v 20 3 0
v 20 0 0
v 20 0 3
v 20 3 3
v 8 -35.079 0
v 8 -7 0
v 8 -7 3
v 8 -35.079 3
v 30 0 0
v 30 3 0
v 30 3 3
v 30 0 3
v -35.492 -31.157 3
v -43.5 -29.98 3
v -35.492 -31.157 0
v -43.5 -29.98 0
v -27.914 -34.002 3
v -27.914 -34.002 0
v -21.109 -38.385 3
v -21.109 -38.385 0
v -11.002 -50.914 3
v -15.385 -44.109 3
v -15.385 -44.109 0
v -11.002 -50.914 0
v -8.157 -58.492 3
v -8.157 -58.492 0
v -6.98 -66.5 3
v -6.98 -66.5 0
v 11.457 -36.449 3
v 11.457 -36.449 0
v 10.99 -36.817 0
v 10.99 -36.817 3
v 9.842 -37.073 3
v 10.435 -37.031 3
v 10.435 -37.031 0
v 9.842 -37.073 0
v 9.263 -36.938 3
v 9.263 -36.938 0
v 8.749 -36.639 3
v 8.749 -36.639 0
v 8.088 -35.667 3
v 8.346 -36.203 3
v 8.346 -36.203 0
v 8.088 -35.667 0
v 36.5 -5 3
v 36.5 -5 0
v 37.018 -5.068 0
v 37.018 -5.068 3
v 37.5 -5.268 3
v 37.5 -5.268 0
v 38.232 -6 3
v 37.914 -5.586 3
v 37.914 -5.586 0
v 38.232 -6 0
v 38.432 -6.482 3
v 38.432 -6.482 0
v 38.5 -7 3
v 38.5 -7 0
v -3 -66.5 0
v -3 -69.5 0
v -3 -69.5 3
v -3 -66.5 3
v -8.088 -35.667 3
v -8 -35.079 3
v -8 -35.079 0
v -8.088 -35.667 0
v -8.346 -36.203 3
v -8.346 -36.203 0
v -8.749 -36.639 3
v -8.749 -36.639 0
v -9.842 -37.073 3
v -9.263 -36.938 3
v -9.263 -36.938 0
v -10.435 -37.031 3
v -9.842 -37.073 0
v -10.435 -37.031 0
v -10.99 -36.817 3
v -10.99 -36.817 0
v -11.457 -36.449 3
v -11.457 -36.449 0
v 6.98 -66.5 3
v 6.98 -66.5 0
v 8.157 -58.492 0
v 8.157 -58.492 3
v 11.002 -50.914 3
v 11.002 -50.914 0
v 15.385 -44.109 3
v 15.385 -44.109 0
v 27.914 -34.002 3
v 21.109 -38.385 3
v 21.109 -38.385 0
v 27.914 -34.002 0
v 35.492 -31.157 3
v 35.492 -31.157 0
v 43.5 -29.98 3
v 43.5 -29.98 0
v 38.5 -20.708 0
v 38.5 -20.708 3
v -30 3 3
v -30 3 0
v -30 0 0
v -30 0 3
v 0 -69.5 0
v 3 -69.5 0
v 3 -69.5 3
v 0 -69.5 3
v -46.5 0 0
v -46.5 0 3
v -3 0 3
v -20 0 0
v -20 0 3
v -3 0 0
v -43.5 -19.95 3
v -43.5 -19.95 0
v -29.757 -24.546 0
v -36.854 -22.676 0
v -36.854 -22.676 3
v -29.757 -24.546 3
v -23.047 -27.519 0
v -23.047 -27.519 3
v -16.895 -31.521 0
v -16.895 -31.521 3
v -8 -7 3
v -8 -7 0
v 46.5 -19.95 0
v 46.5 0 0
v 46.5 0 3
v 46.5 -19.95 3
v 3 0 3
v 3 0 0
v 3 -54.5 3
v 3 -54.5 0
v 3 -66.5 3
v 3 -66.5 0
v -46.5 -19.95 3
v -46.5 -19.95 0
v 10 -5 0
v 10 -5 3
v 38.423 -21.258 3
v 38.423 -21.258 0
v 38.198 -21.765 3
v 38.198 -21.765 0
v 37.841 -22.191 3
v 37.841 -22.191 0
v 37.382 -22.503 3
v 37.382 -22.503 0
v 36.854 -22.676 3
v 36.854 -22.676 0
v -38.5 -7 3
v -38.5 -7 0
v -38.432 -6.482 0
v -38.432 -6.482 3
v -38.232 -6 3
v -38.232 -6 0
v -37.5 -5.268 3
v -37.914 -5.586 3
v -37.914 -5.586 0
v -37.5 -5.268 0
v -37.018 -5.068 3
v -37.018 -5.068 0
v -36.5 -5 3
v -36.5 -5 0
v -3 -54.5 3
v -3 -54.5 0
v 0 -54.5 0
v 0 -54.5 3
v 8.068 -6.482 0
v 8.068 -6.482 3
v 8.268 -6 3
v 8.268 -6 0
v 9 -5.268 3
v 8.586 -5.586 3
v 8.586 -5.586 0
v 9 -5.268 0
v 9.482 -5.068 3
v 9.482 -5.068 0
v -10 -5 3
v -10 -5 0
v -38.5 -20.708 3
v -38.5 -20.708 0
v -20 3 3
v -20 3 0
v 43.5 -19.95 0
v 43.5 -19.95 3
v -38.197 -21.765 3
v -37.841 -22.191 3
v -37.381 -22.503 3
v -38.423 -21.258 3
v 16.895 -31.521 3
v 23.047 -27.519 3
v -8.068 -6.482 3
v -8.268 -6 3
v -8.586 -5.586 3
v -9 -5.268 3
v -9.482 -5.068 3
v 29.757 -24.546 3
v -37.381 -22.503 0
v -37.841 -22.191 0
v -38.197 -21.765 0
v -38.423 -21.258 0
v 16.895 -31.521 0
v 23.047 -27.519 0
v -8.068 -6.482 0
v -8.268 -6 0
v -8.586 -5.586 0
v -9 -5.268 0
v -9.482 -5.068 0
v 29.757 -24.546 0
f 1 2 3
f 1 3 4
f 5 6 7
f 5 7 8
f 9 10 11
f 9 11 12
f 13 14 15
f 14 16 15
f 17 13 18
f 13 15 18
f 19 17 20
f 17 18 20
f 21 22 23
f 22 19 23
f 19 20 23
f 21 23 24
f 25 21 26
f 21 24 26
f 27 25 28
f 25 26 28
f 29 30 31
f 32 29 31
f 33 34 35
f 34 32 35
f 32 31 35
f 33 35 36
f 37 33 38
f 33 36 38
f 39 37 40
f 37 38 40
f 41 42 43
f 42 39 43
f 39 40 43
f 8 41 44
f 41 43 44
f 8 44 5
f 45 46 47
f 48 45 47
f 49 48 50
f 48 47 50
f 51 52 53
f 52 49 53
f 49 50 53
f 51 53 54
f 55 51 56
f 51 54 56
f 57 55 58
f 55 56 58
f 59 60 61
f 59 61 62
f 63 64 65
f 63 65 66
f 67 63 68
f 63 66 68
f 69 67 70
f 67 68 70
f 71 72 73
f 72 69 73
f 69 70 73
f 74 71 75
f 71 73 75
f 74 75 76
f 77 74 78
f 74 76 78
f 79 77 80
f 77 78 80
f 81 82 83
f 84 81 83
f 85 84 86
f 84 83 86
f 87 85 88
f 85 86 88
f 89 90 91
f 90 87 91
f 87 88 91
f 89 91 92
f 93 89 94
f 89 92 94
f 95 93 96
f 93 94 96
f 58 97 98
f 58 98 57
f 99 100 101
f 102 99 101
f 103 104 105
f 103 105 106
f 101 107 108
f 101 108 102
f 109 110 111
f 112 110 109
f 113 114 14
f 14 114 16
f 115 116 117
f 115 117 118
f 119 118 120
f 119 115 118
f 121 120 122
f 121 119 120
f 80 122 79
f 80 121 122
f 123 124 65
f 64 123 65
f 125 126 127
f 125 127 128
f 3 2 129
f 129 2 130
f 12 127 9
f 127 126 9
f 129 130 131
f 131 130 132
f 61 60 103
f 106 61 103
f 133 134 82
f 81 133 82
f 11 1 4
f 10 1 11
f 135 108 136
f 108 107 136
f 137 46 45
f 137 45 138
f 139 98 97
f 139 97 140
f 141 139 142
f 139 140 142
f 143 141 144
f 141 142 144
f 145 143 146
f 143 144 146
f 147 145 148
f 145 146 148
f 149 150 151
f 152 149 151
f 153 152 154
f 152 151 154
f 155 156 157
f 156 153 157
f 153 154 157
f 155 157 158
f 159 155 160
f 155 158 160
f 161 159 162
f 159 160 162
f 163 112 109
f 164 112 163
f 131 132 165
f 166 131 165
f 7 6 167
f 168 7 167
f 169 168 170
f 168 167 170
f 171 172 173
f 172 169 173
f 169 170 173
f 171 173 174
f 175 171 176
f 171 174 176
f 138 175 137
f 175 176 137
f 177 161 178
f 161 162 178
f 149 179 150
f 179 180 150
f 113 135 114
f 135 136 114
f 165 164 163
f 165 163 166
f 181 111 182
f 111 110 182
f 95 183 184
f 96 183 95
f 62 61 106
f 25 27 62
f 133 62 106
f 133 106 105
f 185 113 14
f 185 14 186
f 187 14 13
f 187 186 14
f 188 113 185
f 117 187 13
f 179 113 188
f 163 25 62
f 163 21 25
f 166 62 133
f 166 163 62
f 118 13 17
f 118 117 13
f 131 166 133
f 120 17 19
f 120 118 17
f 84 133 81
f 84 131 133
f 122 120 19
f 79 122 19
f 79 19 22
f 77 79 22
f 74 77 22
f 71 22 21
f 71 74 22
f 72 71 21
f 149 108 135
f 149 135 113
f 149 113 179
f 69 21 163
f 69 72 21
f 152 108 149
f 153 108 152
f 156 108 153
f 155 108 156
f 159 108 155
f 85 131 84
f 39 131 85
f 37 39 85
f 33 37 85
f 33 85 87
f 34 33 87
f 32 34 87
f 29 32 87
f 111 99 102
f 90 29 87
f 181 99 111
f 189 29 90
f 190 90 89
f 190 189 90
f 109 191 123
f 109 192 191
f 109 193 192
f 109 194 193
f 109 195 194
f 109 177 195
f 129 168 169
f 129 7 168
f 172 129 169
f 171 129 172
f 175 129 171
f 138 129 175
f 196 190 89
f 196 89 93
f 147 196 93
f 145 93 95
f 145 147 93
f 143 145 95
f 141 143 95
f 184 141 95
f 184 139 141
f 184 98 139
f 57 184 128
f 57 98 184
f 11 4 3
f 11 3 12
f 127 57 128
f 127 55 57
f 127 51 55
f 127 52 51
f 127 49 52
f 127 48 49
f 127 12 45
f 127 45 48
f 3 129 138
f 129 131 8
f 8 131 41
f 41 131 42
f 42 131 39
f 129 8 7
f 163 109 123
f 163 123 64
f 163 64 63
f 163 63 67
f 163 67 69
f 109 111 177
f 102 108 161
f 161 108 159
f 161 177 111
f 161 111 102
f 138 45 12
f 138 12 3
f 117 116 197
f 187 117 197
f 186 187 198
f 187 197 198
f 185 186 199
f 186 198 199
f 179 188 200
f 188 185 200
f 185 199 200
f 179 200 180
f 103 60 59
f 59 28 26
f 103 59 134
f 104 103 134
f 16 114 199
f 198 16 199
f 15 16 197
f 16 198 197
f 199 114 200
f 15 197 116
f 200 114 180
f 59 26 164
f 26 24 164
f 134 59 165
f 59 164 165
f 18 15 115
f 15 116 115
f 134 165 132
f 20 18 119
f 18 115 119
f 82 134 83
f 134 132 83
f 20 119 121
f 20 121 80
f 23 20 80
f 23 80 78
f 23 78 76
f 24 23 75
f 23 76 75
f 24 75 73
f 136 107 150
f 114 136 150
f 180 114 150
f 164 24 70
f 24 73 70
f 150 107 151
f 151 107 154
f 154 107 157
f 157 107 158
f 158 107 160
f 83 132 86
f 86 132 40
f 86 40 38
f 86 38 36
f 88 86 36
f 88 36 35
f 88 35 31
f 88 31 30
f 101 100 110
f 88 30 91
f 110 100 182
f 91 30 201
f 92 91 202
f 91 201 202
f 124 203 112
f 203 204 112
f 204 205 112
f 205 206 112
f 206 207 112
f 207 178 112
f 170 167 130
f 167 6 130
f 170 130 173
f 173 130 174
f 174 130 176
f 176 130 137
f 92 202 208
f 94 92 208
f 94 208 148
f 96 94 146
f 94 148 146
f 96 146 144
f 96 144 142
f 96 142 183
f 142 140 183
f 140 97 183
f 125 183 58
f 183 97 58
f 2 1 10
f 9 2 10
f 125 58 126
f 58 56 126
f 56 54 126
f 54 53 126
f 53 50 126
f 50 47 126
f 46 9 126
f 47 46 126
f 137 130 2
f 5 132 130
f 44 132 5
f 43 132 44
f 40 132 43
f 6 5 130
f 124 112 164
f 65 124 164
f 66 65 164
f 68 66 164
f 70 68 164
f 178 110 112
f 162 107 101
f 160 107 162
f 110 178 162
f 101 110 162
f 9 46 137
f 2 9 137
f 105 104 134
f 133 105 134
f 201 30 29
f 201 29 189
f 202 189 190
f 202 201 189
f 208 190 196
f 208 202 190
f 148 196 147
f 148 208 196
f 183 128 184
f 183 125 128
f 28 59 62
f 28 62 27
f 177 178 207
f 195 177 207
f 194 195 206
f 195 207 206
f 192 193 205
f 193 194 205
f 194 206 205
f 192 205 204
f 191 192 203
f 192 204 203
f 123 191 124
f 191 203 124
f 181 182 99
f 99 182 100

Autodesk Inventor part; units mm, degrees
ref_plane "YZ Plane" through (0, 0, 0) normal (1, 0, 0) x (0, 1, 0)
ref_plane "XZ Plane" through (0, 0, 0) normal (0, 1, 0) x (-1, 0, 0)
ref_plane "XY Plane" through (0, 0, 0) normal (0, 0, 1) x (1, 0, 0)
sketch "Sketch1" plane through (0, 0, 0) normal (0, 0, 1) x (1, 0, 0)
  line L0 (-46.5, 0) -> (-46.5, -19.95)
  line L1 (-46.5, -19.95) -> (-43.5, -19.95)
  arc A0 (-6.9796, -66.5) -> (-43.5, -29.9796) centre (-45, -68) ccw
  line L2 (-43.5, -19.95) -> (-43.5, -29.9796)
  line L3 (-3, 0) -> (-3, -54.5)
  line L4 (-3, -54.5) -> (0, -54.5)
  line L5 (-20, 0) -> (-20, 3)
  line L6 (-20, 3) -> (-30, 3)
  line L7 (-30, 3) -> (-30, 0)
  line L8 (-46.5, 0) -> (-30, 0)
  line L9 (-20, 0) -> (-3, 0)
  line L10 (-3, -69.5) -> (-3, -66.5)
  line L11 (-38.5, -20.7078) -> (-38.5, -7)
  line L12 (-36.5, -5) -> (-10, -5)
  line L13 (-8, -7) -> (-8, -35.0788)
  arc A1 (-11.4568, -36.4491) -> (-36.8538, -22.6763) centre (-45, -68) ccw
  arc A2 (-38.5, -20.7078) -> (-36.8538, -22.6763) centre (-36.5, -20.7078) ccw
  arc A3 (-36.5, -5) -> (-38.5, -7) centre (-36.5, -7) ccw
  arc A4 (-8, -7) -> (-10, -5) centre (-10, -7) ccw
  arc A5 (-11.4568, -36.4491) -> (-8, -35.0788) centre (-10, -35.0788) ccw
  line L14 (-3, -66.5) -> (-6.9796, -66.5)
  line L15 (-3, -69.5) -> (0, -69.5)
  line L16 (46.5, 0) -> (46.5, -19.95)
  line L17 (46.5, -19.95) -> (43.5, -19.95)
  arc A6 (43.5, -29.9796) -> (6.9796, -66.5) centre (45, -68) ccw
  line L18 (43.5, -19.95) -> (43.5, -29.9796)
  line L19 (3, 0) -> (3, -54.5)
  line L20 (3, -54.5) -> (0, -54.5)
  line L21 (20, 0) -> (20, 3)
  line L22 (20, 3) -> (30, 3)
  line L23 (30, 3) -> (30, 0)
  line L24 (46.5, 0) -> (30, 0)
  line L25 (20, 0) -> (3, 0)
  line L26 (3, -69.5) -> (3, -66.5)
  line L27 (38.5, -20.7078) -> (38.5, -7)
  line L28 (36.5, -5) -> (10, -5)
  line L29 (8, -7) -> (8, -35.0788)
  arc A7 (36.8538, -22.6763) -> (11.4568, -36.4491) centre (45, -68) ccw
  arc A8 (36.8538, -22.6763) -> (38.5, -20.7078) centre (36.5, -20.7078) ccw
  arc A9 (38.5, -7) -> (36.5, -5) centre (36.5, -7) ccw
  arc A10 (10, -5) -> (8, -7) centre (10, -7) ccw
  arc A11 (8, -35.0788) -> (11.4568, -36.4491) centre (10, -35.0788) ccw
  line L30 (3, -66.5) -> (6.9796, -66.5)
  line L31 (3, -69.5) -> (0, -69.5)
  point P0 (0, 0)
  point P1 (-8, -40.5846)
  point P2 (-38.5, -22.411)
  point P3 (8, -40.5846)
  point P4 (38.5, -22.411)
  dimension "d1" = 46.5
  dimension "d3" = 3
  dimension "d5" = 76.1
  dimension "d7" = 45
  dimension "d10" = 10
  dimension "d24" = 10
  dimension "d25" = 20
  dimension "d29" = 3
  dimension "d32" = 8
  dimension "d33" = 5
  dimension "d36" = 17
  dimension "d37" = 16.5
  dimension "d38" = 19.95
  dimension "d39" = 5
  dimension "d40" = 2
  dimension "d45" = 8
  dimension "d49" = 69.5
  dimension "d50" = 15
extrude "Extrusion4" add sketch "Sketch1" along normal blind 3
properties part number "OpenROV 2_2 Aft Ducting Brace"
